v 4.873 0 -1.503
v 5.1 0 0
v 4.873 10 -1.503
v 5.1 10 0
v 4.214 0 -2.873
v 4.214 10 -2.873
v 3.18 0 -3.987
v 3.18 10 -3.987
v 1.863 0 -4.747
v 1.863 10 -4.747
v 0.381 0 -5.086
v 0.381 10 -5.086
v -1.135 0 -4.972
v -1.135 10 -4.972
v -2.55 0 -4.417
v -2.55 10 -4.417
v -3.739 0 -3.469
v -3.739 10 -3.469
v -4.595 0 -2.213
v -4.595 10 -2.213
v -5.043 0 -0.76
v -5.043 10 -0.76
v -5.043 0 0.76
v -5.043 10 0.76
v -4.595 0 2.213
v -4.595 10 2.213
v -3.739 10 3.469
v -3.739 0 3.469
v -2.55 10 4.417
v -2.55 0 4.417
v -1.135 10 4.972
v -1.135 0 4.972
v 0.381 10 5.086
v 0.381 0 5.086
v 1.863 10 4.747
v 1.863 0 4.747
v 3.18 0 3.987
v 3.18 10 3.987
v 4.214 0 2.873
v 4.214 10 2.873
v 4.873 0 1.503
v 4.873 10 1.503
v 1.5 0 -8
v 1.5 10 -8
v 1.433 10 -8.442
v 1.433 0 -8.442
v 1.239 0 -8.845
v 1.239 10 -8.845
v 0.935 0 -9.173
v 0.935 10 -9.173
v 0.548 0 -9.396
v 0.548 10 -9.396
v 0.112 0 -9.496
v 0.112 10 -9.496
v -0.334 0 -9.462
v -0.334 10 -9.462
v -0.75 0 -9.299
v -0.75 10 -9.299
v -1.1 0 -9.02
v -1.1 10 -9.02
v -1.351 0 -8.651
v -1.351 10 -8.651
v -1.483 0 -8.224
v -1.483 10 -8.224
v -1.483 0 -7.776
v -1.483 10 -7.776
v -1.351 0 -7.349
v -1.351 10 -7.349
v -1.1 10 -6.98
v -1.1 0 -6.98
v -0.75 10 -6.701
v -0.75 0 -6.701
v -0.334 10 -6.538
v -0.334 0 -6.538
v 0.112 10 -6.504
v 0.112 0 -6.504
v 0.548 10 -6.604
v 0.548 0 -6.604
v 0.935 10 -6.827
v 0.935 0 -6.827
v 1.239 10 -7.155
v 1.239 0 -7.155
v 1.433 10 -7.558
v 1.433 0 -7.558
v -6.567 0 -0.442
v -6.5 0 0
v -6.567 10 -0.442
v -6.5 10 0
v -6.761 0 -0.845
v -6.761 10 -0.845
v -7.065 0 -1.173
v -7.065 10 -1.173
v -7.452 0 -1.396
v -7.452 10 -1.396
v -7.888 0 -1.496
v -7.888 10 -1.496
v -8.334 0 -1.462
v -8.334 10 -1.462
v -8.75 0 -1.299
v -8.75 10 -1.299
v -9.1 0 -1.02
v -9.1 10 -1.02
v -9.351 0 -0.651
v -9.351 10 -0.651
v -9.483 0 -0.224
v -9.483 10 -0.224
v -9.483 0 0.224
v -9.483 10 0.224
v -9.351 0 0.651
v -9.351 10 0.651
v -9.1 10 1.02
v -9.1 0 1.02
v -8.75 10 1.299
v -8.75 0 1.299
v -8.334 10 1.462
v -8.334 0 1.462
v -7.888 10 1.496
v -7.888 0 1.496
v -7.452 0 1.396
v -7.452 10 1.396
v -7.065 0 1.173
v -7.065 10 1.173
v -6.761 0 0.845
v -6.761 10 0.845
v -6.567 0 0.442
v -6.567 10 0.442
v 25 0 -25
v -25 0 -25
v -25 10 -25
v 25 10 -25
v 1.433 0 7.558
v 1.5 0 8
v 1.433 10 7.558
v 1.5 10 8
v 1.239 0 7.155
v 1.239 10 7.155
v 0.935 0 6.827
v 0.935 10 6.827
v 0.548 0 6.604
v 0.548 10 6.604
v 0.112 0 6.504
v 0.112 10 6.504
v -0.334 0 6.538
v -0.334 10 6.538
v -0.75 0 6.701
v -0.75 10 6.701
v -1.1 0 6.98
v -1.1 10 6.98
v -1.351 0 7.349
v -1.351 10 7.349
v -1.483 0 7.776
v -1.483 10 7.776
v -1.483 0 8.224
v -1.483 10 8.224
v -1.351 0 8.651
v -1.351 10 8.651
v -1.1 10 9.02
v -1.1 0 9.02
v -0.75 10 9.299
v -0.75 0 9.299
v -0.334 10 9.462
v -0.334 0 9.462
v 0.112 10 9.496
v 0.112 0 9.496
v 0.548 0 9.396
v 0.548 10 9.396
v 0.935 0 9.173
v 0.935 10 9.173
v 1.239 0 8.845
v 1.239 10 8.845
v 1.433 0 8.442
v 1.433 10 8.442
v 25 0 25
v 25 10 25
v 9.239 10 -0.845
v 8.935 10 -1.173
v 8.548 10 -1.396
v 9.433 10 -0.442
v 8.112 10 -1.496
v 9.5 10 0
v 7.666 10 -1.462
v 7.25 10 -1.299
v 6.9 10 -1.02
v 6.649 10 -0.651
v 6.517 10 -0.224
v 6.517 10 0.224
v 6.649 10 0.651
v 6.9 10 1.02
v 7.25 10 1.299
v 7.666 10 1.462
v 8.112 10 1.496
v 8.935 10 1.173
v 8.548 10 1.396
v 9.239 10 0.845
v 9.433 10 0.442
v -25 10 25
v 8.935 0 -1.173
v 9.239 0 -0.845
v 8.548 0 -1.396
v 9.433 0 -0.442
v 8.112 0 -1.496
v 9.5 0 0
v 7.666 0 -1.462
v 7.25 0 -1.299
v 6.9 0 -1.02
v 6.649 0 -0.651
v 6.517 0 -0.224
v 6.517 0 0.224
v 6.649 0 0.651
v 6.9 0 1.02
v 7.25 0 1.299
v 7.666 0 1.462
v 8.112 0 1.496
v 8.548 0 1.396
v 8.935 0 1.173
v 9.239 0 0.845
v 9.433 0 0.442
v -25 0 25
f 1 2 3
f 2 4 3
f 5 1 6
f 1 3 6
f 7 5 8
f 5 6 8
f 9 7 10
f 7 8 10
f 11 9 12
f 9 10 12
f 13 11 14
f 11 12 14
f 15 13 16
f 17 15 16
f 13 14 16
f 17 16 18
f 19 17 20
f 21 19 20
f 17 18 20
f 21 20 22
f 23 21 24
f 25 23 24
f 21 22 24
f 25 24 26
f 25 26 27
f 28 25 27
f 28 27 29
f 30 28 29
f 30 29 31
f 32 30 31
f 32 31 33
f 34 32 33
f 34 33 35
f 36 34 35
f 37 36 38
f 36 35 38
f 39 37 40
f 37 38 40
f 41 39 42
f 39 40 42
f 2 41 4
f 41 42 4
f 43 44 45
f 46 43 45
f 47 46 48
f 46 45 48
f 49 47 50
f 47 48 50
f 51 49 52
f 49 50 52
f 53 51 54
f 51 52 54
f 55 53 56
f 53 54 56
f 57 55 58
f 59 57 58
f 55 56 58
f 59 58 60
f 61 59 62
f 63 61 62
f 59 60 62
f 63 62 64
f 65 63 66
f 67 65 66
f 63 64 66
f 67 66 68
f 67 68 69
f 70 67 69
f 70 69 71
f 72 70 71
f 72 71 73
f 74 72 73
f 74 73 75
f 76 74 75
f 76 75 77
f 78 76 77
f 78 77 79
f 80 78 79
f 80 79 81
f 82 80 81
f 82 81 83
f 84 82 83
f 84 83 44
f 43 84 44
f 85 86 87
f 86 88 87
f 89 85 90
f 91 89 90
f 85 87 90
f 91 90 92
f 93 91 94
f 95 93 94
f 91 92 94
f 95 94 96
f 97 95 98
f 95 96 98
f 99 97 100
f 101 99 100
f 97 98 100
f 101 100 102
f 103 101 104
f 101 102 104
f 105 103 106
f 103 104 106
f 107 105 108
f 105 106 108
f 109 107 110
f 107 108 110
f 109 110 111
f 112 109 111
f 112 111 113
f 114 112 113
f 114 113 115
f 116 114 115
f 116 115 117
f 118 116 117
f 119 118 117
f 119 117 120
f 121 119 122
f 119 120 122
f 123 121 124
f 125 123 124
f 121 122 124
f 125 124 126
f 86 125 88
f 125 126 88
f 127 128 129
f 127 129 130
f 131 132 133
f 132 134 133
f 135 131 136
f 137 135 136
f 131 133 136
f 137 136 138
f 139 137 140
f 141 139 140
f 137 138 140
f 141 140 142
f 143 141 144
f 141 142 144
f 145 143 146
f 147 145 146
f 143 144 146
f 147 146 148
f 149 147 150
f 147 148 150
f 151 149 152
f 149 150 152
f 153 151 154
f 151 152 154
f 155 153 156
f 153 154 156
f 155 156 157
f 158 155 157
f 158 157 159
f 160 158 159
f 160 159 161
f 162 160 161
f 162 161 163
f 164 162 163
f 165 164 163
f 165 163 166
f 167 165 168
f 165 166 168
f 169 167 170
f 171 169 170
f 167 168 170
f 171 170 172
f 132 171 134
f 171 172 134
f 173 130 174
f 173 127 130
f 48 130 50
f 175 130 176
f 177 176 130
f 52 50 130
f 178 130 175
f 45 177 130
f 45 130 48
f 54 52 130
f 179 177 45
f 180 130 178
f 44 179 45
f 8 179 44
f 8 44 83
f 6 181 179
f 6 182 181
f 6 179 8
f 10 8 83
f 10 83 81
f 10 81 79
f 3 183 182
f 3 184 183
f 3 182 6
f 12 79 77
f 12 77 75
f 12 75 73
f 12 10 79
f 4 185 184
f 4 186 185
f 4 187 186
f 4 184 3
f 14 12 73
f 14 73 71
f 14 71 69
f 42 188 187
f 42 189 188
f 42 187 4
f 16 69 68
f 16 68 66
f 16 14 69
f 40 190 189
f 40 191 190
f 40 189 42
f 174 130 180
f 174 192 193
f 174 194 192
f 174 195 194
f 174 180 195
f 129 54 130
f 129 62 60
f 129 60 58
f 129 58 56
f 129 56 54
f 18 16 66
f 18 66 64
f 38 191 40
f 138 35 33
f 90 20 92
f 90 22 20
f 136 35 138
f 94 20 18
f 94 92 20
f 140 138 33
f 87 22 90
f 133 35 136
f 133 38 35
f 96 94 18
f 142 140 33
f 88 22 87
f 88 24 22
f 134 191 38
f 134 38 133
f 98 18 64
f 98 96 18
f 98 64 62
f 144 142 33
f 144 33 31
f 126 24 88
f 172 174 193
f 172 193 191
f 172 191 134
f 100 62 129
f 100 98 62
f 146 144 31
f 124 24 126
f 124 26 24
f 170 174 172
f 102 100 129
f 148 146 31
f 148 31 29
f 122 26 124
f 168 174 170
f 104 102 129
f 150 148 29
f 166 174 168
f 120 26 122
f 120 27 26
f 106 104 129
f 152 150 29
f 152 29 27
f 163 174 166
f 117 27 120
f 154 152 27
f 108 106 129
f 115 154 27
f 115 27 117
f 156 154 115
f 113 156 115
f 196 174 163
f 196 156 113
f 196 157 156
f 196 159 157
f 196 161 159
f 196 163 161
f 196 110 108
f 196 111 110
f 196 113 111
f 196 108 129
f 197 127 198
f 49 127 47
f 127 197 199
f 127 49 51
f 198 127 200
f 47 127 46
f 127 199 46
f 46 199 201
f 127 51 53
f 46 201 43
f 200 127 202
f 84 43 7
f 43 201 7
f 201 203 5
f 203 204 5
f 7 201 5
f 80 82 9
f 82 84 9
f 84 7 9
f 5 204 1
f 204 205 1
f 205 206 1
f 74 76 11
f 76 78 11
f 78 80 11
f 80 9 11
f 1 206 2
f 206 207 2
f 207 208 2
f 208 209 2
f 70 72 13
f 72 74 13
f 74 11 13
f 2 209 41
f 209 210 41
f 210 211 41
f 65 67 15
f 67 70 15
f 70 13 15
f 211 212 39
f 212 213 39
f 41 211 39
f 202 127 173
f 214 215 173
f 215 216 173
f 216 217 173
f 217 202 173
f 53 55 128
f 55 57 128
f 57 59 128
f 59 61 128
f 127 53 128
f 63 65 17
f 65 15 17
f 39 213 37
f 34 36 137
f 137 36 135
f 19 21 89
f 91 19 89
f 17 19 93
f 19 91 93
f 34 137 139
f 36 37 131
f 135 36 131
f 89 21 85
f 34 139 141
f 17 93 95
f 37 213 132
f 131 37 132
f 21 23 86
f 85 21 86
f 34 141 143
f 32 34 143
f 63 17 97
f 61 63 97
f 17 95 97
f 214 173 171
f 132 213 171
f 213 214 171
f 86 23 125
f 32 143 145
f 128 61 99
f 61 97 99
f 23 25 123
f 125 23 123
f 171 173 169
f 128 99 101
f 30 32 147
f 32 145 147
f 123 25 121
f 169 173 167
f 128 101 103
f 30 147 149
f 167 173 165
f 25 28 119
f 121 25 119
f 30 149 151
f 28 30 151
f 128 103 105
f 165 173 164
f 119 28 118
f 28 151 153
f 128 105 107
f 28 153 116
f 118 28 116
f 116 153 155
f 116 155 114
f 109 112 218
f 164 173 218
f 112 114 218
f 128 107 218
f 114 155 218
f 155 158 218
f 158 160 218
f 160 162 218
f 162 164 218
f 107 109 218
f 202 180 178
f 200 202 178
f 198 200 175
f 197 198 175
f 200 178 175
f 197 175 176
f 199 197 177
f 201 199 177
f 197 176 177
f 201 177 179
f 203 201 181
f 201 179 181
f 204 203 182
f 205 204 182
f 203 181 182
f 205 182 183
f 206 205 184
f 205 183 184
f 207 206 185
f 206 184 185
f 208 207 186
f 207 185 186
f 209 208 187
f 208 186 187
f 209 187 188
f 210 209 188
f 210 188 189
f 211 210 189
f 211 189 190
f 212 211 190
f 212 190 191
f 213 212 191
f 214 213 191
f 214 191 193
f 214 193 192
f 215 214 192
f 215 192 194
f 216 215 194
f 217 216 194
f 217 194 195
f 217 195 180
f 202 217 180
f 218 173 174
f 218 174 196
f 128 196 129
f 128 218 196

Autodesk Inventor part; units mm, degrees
ref_plane "YZ Plane" through (0, 0, 0) normal (1, 0, 0) x (0, 1, 0)
ref_plane "XZ Plane" through (0, 0, 0) normal (0, 1, 0) x (-1, 0, 0)
ref_plane "XY Plane" through (0, 0, 0) normal (0, 0, 1) x (1, 0, 0)
sketch "Sketch1" plane through (0, 0, 0) normal (0, 1, 0) x (-1, 0, 0)
  line L0 (25, -25) -> (-25, -25)
  line L1 (-25, -25) -> (-25, 25)
  line L2 (-25, 25) -> (25, 25)
  line L3 (25, 25) -> (25, -25)
  line L4 (25, -25) -> (-25, 25) construction
  line L5 (-25, -25) -> (25, 25) construction
  point P0 (0, 0)
  dimension "d0" = 50
  dimension "d1" = 50
extrude "Extrusion1" add sketch "Sketch1" along normal blind 10
sketch "Sketch2" plane through (0, 10, 0) normal (0, 1, 0) x (1, 0, 0)
  line L0 (25, -25) -> (25, 25) projected
  line L1 (0, 0) -> (0, 8)
  circle A0 centre (0, 8) radius 1.5
  circle A1 centre (0, 0) radius 5.1
  circle A2 centre (-8, 0) radius 1.5
  circle A3 centre (0, -8) radius 1.5
  circle A4 centre (8, 0) radius 1.5
  dimension "d4" = 8
  dimension "screw_hole" = 3
  dimension "center_hole" = 10.2
  dimension "d9" = 360
extrude "Extrusion2" cut sketch "Sketch2" against normal up to next
properties part number "ACMENUTgen"
